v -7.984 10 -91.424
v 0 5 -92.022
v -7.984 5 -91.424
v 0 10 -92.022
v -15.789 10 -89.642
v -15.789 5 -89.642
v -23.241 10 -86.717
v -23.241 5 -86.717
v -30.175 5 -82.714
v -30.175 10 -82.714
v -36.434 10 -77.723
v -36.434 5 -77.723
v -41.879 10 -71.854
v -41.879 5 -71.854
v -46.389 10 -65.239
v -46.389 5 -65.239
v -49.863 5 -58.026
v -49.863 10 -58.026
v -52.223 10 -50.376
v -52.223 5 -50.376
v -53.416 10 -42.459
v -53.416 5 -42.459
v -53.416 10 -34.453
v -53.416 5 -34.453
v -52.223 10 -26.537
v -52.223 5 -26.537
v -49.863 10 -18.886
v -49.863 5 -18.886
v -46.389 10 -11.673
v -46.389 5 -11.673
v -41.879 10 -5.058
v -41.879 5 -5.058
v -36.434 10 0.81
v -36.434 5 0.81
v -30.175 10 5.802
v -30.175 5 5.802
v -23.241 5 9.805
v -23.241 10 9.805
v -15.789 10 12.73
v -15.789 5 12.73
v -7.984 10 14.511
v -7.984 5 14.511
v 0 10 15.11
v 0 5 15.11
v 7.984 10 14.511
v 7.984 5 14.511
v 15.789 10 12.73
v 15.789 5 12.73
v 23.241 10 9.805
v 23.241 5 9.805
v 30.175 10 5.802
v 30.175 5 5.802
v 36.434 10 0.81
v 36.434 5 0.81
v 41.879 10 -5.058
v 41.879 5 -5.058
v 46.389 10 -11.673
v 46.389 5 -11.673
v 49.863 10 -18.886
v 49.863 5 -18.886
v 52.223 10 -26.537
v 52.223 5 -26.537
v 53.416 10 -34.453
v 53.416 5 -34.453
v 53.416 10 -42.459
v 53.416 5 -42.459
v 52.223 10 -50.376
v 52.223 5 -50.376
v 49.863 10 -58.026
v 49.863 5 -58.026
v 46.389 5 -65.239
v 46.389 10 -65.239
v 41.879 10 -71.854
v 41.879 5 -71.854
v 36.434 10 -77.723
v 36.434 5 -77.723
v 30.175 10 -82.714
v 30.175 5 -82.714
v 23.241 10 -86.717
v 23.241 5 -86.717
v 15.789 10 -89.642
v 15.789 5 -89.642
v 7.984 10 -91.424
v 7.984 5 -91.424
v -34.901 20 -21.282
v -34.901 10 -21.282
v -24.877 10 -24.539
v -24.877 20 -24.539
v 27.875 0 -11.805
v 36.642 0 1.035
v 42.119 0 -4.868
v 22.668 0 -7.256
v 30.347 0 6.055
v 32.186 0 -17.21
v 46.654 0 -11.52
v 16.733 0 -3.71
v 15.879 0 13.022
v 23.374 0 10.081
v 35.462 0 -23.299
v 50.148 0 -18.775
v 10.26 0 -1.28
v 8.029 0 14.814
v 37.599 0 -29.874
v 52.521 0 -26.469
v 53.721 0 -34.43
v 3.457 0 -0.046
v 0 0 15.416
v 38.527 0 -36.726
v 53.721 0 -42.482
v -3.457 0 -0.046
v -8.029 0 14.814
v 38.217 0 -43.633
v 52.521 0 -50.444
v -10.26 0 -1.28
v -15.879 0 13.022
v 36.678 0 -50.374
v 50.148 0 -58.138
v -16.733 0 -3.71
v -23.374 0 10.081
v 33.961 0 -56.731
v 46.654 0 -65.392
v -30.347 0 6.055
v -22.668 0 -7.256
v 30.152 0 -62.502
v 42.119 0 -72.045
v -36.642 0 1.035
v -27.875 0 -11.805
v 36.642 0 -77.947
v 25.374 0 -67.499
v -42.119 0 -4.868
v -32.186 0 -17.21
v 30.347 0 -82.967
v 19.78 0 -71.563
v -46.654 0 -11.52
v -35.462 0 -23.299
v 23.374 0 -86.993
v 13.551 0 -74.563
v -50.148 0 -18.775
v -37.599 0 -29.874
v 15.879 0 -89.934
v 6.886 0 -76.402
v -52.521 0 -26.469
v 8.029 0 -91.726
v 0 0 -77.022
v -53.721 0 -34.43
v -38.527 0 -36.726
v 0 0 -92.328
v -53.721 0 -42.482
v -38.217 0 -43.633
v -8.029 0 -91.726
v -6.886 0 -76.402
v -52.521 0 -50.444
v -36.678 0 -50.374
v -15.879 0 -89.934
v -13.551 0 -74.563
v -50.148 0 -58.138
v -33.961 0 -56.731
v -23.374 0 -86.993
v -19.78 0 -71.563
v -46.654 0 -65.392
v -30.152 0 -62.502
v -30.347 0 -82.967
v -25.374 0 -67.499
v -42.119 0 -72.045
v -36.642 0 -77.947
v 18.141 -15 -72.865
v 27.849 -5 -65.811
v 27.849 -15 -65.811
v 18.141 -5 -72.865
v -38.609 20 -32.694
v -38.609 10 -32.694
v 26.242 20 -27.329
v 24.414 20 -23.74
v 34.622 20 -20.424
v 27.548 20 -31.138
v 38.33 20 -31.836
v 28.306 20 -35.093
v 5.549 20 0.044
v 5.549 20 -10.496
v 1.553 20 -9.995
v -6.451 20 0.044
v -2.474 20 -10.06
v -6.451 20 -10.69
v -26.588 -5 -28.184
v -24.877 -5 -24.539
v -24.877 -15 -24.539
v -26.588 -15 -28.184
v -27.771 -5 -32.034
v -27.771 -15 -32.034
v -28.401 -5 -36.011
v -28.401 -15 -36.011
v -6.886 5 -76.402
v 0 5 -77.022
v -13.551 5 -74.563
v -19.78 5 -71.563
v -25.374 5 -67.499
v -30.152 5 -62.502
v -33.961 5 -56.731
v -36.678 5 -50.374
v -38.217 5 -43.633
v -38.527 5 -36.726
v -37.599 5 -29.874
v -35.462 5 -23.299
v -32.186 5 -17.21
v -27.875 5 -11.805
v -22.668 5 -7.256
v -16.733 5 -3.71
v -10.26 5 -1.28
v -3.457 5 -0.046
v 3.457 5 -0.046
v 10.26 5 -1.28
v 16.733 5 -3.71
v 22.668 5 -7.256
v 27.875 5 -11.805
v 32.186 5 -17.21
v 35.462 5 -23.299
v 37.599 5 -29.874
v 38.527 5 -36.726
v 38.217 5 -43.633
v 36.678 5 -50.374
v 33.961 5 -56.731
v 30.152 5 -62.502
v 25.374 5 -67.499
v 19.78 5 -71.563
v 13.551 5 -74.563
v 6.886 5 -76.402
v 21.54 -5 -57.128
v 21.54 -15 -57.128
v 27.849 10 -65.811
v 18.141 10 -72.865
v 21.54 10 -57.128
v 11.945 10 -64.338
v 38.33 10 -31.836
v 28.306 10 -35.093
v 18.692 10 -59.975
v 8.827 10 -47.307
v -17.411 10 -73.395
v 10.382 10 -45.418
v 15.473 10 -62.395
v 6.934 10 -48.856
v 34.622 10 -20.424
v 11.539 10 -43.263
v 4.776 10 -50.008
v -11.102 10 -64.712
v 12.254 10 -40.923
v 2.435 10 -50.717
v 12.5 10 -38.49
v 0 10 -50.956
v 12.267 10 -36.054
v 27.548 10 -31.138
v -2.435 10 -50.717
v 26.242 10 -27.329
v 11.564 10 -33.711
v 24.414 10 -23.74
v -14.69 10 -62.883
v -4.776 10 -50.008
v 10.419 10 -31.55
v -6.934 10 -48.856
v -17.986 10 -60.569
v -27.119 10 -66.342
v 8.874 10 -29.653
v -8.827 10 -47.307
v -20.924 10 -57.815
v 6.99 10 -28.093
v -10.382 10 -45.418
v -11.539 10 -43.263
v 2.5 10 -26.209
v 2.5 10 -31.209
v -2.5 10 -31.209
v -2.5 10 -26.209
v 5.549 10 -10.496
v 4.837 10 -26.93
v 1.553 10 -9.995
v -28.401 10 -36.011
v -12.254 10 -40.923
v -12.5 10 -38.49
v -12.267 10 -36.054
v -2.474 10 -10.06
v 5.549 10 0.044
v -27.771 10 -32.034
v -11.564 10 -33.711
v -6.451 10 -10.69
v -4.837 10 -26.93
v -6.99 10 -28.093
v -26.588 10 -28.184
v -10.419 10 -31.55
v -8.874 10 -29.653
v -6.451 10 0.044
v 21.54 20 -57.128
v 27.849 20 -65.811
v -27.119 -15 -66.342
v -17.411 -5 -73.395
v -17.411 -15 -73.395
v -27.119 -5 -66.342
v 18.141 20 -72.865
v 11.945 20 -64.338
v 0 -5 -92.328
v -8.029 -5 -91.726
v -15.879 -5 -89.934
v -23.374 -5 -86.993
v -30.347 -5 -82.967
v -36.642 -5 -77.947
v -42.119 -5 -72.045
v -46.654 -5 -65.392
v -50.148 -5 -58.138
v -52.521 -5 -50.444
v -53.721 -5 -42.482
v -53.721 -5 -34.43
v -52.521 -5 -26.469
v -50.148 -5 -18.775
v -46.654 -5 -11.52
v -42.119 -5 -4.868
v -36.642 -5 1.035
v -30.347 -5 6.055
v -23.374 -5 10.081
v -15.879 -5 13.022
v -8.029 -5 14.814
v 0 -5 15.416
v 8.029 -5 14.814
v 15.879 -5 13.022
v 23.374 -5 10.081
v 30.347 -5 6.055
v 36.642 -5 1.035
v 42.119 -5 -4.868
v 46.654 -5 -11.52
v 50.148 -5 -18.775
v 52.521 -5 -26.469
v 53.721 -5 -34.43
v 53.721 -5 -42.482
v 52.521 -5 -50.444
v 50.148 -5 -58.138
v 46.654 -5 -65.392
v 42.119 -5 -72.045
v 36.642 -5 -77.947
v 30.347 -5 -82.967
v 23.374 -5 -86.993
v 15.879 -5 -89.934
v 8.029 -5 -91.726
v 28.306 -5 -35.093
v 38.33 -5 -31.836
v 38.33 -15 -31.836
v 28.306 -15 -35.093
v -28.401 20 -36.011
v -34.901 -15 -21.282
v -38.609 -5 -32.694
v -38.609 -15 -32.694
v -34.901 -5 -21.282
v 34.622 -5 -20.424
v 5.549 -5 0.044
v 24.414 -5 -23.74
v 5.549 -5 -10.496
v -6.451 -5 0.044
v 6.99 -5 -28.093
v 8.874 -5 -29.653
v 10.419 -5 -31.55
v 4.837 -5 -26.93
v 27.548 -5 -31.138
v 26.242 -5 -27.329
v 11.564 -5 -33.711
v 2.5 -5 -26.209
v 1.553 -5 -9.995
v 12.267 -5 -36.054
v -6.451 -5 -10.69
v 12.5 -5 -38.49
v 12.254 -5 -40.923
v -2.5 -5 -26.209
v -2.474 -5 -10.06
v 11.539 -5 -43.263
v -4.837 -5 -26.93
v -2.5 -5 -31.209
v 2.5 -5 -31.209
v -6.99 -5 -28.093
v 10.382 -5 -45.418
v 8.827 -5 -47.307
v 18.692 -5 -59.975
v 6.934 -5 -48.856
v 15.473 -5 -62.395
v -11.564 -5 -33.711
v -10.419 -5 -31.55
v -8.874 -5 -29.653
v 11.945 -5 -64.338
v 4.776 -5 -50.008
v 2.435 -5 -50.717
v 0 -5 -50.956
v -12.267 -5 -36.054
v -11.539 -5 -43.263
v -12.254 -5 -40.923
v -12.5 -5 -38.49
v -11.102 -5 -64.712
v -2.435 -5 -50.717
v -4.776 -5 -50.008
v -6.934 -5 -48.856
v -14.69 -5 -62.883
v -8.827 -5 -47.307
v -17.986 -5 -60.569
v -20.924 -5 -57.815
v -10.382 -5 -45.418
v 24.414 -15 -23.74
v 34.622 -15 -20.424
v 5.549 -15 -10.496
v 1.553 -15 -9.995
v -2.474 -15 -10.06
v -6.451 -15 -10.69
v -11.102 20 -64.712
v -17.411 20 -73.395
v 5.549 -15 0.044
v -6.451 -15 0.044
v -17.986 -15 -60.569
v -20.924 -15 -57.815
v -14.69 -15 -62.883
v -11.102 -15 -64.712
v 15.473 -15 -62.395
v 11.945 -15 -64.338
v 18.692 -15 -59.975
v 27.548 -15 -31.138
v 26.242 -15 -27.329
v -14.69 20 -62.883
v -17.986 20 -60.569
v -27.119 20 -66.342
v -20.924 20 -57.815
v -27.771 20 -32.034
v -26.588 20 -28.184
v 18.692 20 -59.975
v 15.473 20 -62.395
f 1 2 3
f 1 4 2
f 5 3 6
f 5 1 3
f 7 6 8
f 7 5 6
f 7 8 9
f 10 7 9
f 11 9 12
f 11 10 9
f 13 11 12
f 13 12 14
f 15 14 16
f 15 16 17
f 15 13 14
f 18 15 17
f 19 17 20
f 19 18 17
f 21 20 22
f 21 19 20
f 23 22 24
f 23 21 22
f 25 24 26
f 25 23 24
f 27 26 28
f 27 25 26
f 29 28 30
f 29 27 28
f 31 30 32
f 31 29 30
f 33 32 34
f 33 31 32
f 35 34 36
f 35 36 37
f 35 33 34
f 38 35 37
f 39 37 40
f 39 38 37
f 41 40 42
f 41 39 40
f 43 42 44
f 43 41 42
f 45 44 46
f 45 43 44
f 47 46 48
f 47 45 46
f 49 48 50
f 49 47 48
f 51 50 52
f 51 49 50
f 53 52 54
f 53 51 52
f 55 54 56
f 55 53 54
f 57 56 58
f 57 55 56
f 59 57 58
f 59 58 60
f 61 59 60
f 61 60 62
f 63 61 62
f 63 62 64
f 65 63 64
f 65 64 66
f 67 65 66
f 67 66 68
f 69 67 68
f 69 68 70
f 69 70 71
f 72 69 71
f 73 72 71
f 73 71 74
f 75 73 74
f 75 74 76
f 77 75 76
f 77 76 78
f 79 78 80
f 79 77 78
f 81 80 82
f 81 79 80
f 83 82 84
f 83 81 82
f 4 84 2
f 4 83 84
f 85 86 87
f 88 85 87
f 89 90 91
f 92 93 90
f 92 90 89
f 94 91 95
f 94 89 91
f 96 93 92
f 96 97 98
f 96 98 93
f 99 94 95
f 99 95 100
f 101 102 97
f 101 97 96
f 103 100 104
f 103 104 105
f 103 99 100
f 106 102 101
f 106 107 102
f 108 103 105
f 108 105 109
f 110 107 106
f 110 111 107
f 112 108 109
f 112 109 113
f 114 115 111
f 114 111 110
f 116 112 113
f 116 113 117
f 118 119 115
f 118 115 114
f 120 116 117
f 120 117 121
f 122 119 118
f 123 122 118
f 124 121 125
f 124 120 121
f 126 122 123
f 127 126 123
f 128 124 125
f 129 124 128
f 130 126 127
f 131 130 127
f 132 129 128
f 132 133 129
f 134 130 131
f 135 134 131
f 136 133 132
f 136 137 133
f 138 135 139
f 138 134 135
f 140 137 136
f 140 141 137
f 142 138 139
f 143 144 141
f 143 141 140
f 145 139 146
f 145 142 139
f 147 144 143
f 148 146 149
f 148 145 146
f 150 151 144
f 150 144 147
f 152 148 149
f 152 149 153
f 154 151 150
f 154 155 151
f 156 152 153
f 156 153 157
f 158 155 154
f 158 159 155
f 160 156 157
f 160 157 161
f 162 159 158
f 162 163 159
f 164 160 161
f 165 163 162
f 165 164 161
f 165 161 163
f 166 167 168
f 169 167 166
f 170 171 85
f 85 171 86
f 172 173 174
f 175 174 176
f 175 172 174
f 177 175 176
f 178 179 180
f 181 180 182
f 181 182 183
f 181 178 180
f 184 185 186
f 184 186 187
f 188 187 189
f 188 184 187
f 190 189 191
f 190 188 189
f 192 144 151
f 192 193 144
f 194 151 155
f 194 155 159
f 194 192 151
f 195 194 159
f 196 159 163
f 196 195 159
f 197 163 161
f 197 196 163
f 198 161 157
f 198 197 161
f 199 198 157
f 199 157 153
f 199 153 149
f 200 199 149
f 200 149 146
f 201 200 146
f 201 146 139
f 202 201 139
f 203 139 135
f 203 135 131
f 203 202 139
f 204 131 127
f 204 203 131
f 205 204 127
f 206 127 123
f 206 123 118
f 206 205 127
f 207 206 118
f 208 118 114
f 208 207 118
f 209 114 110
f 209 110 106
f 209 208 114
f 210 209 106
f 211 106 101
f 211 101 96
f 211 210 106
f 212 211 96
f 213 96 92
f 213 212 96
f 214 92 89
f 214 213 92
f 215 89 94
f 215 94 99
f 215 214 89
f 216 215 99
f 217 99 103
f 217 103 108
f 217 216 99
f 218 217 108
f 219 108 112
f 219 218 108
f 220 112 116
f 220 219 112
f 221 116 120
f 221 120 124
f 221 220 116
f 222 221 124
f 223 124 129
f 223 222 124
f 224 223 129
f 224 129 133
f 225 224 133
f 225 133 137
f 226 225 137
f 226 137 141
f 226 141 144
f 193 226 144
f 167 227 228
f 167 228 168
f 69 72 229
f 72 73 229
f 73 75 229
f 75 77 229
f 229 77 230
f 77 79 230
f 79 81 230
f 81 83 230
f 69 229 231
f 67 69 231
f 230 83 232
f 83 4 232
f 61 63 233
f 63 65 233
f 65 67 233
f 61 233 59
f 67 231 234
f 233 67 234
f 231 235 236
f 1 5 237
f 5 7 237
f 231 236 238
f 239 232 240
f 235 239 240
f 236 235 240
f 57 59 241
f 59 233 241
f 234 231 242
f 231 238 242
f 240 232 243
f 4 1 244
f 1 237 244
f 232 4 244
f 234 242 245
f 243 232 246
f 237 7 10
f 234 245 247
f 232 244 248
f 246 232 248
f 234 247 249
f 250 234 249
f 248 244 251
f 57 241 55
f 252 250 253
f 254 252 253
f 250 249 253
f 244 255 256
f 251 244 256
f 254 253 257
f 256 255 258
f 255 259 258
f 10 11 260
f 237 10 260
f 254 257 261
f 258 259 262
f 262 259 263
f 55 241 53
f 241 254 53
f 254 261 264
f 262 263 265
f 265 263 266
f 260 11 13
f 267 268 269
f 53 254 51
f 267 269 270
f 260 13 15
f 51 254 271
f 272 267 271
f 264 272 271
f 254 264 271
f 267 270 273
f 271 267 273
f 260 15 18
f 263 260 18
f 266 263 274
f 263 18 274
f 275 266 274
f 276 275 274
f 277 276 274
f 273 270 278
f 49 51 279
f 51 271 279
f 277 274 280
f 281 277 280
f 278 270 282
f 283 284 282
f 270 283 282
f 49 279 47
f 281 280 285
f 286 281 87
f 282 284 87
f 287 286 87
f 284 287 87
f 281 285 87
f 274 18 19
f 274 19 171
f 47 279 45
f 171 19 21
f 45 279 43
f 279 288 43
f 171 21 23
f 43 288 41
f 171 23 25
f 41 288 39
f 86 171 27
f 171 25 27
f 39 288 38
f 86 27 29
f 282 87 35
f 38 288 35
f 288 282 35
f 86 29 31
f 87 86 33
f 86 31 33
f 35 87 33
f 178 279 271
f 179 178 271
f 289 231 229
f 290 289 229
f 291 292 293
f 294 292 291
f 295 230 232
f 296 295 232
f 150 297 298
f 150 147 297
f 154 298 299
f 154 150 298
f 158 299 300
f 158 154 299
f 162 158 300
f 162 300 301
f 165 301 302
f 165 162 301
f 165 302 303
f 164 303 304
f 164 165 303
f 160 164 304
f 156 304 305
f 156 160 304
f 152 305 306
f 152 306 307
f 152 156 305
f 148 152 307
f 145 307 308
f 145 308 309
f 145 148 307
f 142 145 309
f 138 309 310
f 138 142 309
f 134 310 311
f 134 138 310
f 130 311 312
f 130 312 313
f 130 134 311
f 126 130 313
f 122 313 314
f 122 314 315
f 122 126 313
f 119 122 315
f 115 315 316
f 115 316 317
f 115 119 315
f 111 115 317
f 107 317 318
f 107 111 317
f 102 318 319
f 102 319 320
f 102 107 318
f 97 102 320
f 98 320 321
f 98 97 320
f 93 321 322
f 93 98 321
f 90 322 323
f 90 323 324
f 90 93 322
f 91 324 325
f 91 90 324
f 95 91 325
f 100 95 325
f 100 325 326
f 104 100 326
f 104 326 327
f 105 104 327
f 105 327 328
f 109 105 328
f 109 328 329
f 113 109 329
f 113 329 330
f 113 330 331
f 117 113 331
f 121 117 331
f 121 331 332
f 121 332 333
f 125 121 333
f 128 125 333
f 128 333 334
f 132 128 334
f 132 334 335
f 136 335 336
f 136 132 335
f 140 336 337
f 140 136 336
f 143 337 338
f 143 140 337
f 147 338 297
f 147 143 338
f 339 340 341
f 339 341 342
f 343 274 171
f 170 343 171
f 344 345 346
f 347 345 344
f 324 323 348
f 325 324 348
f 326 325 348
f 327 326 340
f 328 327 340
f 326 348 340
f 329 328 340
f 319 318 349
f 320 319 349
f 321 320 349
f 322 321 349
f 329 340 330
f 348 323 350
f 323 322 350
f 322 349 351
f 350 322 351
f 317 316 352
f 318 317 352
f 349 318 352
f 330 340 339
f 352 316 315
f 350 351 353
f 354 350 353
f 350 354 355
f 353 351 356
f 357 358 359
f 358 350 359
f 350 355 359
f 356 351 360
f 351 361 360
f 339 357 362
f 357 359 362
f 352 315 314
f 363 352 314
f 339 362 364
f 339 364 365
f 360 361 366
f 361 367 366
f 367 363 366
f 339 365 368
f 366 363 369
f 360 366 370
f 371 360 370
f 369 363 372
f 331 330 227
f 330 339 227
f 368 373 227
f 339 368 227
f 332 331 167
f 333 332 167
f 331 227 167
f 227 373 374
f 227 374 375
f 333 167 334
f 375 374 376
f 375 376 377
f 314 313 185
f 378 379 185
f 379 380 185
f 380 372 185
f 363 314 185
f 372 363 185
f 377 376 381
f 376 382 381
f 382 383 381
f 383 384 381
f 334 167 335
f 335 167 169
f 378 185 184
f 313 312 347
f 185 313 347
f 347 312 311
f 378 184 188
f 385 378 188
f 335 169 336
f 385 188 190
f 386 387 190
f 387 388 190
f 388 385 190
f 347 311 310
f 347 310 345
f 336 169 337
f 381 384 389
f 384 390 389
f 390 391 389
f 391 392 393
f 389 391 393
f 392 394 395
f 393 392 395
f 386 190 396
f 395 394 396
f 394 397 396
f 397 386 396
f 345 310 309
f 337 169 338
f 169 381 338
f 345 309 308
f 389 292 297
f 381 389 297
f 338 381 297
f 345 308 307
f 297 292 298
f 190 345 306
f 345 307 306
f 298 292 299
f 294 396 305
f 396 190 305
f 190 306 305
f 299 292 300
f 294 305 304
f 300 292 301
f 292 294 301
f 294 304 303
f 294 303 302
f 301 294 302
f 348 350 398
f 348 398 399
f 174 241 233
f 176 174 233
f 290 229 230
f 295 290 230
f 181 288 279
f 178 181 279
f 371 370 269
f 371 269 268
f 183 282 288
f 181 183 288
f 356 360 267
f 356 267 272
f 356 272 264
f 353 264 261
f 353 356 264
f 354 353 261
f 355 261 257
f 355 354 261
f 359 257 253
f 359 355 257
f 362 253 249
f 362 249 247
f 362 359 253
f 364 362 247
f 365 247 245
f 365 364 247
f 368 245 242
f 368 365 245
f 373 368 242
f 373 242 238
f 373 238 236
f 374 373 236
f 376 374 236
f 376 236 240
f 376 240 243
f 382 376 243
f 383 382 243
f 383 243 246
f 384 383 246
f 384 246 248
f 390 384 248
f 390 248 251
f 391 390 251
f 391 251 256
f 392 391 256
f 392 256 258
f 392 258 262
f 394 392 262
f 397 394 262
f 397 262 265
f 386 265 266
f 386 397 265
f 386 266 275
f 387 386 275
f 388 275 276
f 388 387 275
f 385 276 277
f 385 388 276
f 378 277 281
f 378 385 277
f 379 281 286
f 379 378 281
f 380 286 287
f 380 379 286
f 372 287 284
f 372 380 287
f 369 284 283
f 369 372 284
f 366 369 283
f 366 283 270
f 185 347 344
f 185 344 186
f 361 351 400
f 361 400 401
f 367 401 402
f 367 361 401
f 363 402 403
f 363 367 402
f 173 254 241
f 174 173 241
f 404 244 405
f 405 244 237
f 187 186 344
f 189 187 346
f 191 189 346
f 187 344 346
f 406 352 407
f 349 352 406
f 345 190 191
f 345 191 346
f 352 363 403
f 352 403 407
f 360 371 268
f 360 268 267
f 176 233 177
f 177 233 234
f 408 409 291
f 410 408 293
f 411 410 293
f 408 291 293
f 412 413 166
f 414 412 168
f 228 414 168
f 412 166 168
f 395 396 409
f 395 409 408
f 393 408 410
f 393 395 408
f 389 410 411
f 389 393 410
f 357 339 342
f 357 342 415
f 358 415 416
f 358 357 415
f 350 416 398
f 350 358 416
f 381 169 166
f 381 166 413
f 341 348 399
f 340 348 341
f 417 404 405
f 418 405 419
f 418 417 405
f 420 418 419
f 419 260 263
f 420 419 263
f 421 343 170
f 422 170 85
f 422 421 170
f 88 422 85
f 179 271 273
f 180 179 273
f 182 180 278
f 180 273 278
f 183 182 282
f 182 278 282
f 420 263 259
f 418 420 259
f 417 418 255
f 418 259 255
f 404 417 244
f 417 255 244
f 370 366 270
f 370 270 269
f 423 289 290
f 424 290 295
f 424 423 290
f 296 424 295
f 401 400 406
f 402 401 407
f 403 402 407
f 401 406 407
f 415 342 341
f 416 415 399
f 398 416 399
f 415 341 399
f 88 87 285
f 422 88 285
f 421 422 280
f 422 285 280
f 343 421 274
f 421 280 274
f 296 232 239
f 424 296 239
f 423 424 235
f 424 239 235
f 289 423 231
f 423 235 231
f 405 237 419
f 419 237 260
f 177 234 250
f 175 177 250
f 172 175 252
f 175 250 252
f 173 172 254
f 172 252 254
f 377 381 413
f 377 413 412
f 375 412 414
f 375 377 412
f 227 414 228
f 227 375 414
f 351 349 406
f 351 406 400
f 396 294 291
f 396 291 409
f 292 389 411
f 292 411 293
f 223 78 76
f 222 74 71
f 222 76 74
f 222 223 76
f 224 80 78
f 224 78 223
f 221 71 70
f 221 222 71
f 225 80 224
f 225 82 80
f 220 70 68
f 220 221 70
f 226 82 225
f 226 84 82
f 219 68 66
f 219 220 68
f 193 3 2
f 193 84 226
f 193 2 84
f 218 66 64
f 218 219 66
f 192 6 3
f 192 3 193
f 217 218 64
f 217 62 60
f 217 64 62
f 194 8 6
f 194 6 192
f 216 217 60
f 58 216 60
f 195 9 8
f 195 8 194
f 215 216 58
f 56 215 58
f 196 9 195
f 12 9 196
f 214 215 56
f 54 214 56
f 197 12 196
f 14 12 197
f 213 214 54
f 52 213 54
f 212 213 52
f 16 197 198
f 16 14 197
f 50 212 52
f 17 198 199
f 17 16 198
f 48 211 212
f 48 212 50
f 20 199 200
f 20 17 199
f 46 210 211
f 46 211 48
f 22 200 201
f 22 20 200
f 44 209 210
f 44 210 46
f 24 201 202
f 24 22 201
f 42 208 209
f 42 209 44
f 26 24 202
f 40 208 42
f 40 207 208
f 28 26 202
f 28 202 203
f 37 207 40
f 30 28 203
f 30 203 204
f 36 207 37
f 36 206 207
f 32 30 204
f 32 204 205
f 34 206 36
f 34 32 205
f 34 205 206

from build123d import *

# Parameters (mm, degrees)
BOSS_EXTRUDE1_START  = -15
BOSS_EXTRUDE1_DEPTH  = 15
BOSS_EXTRUDE2_DEPTH  = 10
CIRPATTERN1_COUNT    = 5
MIRROR3_COPY_1_DEPTH = 10
MIRROR3_COPY_2_DEPTH = 10
MIRROR3_COPY_3_DEPTH = 10
MIRROR3_COPY_4_DEPTH = 10


with BuildPart() as part:
    # Sketch1 → Revolve1 (revolve)
    with BuildSketch(Plane.YZ, mode=Mode.PRIVATE) as revolve1_sk:
        Polygon((-4.999994159, -22.251027603), (-4.999994159, 15.415581909), (5.841e-06, 15.415581909), (5.841e-06, 0.109652172), (5.000005841, 0.109652172), (5.000005841, 15.109652172), (10.000005841, 15.109652172), (10.000005841, 0.109652172), (10.000005841, -25.956139131), (-4.999994159, -25.956139131), align=None)
    revolve(revolve1_sk.sketch.rotate(Axis((0, -19.999999988, -38.456139131), (0, 1, 0)), 180), axis=Axis((0, -19.999999988, -38.456139131), (0, 1, 0)))

    # Sketch2 → Boss-Extrude1 (add)
    with BuildSketch(Plane(origin=(0, 10.000005841, 0), x_dir=(1, 0, 0), z_dir=(0, 1, 0)).offset(BOSS_EXTRUDE1_START)):
        with BuildLine():
            Line((-2.5, 31.208690417), (2.5, 31.208690417))
            Line((2.5, 31.208690417), (2.5, 26.208690417))
            ThreePointArc((2.5, 26.208690417), (0, 25.956139131), (-2.5, 26.208690417))
            Line((-2.5, 26.208690417), (-2.5, 31.208690417))
        make_face()
    extrude(amount=BOSS_EXTRUDE1_DEPTH)

    # Sketch3 → Boss-Extrude2 (add)
    with BuildSketch(Plane.XZ.offset(4.999994159)):
        with BuildLine():
            Line((-6.45112782, 0.043860869), (5.54887218, 0.043860869))
            Line((5.54887218, 0.043860869), (5.54887218, -10.496030583))
            ThreePointArc((5.54887218, -10.496030583), (-0.461398285, -9.956302999), (-6.45112782, -10.689649467))
            Line((-6.45112782, -10.689649467), (-6.45112782, 0.043860869))
        make_face()
    boss_extrude2 = extrude(amount=BOSS_EXTRUDE2_DEPTH)

    # CirPattern1: Boss-Extrude2 ×5 about axis
    cirpattern1_axis = Axis((0, 0, -38.456139131), (0, 1, 0))
    for i in range(1, CIRPATTERN1_COUNT):
        add(boss_extrude2.rotate(cirpattern1_axis, i * 360 / CIRPATTERN1_COUNT))

    # Mirror3: Boss-Extrude2 across plane
    add(boss_extrude2.mirror(Plane(origin=(0, 2.500005841, 0), x_dir=(0, 0, 1), z_dir=(0, -1, 0))))

    # Mirror3 copy 1 sketch → Mirror3 copy 1 (add)
    with BuildSketch(Plane(origin=(36.573961712, 10.000005841, -26.572538602), x_dir=(0.30901699437494745, 4.31570827698209e-15, -0.9510565162951535), z_dir=(0, 1, 0))):
        with BuildLine():
            Line((-6.45112782, -0.043860869), (5.54887218, -0.043860869))
            Line((5.54887218, -0.043860869), (5.54887218, 10.496030583))
            ThreePointArc((5.54887218, 10.496030583), (-0.461398285, 9.956302999), (-6.45112782, 10.689649467))
            Line((-6.45112782, 10.689649467), (-6.45112782, -0.043860869))
        make_face()
    extrude(amount=MIRROR3_COPY_1_DEPTH)

    # Mirror3 copy 2 sketch → Mirror3 copy 2 (add)
    with BuildSketch(Plane(origin=(22.603951441, 10.000005841, -69.567809226), x_dir=(-0.8090169943749473, -1.1298670954668355e-14, -0.5877852522924732), z_dir=(0, 1, 0))):
        with BuildLine():
            Line((-6.45112782, -0.043860869), (5.54887218, -0.043860869))
            Line((5.54887218, -0.043860869), (5.54887218, 10.496030583))
            ThreePointArc((5.54887218, 10.496030583), (-0.461398285, 9.956302999), (-6.45112782, 10.689649467))
            Line((-6.45112782, 10.689649467), (-6.45112782, -0.043860869))
        make_face()
    extrude(amount=MIRROR3_COPY_2_DEPTH)

    # Mirror3 copy 3 sketch → Mirror3 copy 3 (add)
    with BuildSketch(Plane(origin=(-22.603951441, 10.000005841, -69.567809226), x_dir=(-0.8090169943749476, -1.1298670954668358e-14, 0.587785252292473), z_dir=(0, 1, 0))):
        with BuildLine():
            Line((-6.45112782, -0.043860869), (5.54887218, -0.043860869))
            Line((5.54887218, -0.043860869), (5.54887218, 10.496030583))
            ThreePointArc((5.54887218, 10.496030583), (-0.461398285, 9.956302999), (-6.45112782, 10.689649467))
            Line((-6.45112782, 10.689649467), (-6.45112782, -0.043860869))
        make_face()
    extrude(amount=MIRROR3_COPY_3_DEPTH)

    # Mirror3 copy 4 sketch → Mirror3 copy 4 (add)
    with BuildSketch(Plane(origin=(-36.573961712, 10.000005841, -26.572538602), x_dir=(0.30901699437494723, 4.315708276982087e-15, 0.9510565162951536), z_dir=(0, 1, 0))):
        with BuildLine():
            Line((-6.45112782, -0.043860869), (5.54887218, -0.043860869))
            Line((5.54887218, -0.043860869), (5.54887218, 10.496030583))
            ThreePointArc((5.54887218, 10.496030583), (-0.461398285, 9.956302999), (-6.45112782, 10.689649467))
            Line((-6.45112782, 10.689649467), (-6.45112782, -0.043860869))
        make_face()
    extrude(amount=MIRROR3_COPY_4_DEPTH)


solid = part.part
